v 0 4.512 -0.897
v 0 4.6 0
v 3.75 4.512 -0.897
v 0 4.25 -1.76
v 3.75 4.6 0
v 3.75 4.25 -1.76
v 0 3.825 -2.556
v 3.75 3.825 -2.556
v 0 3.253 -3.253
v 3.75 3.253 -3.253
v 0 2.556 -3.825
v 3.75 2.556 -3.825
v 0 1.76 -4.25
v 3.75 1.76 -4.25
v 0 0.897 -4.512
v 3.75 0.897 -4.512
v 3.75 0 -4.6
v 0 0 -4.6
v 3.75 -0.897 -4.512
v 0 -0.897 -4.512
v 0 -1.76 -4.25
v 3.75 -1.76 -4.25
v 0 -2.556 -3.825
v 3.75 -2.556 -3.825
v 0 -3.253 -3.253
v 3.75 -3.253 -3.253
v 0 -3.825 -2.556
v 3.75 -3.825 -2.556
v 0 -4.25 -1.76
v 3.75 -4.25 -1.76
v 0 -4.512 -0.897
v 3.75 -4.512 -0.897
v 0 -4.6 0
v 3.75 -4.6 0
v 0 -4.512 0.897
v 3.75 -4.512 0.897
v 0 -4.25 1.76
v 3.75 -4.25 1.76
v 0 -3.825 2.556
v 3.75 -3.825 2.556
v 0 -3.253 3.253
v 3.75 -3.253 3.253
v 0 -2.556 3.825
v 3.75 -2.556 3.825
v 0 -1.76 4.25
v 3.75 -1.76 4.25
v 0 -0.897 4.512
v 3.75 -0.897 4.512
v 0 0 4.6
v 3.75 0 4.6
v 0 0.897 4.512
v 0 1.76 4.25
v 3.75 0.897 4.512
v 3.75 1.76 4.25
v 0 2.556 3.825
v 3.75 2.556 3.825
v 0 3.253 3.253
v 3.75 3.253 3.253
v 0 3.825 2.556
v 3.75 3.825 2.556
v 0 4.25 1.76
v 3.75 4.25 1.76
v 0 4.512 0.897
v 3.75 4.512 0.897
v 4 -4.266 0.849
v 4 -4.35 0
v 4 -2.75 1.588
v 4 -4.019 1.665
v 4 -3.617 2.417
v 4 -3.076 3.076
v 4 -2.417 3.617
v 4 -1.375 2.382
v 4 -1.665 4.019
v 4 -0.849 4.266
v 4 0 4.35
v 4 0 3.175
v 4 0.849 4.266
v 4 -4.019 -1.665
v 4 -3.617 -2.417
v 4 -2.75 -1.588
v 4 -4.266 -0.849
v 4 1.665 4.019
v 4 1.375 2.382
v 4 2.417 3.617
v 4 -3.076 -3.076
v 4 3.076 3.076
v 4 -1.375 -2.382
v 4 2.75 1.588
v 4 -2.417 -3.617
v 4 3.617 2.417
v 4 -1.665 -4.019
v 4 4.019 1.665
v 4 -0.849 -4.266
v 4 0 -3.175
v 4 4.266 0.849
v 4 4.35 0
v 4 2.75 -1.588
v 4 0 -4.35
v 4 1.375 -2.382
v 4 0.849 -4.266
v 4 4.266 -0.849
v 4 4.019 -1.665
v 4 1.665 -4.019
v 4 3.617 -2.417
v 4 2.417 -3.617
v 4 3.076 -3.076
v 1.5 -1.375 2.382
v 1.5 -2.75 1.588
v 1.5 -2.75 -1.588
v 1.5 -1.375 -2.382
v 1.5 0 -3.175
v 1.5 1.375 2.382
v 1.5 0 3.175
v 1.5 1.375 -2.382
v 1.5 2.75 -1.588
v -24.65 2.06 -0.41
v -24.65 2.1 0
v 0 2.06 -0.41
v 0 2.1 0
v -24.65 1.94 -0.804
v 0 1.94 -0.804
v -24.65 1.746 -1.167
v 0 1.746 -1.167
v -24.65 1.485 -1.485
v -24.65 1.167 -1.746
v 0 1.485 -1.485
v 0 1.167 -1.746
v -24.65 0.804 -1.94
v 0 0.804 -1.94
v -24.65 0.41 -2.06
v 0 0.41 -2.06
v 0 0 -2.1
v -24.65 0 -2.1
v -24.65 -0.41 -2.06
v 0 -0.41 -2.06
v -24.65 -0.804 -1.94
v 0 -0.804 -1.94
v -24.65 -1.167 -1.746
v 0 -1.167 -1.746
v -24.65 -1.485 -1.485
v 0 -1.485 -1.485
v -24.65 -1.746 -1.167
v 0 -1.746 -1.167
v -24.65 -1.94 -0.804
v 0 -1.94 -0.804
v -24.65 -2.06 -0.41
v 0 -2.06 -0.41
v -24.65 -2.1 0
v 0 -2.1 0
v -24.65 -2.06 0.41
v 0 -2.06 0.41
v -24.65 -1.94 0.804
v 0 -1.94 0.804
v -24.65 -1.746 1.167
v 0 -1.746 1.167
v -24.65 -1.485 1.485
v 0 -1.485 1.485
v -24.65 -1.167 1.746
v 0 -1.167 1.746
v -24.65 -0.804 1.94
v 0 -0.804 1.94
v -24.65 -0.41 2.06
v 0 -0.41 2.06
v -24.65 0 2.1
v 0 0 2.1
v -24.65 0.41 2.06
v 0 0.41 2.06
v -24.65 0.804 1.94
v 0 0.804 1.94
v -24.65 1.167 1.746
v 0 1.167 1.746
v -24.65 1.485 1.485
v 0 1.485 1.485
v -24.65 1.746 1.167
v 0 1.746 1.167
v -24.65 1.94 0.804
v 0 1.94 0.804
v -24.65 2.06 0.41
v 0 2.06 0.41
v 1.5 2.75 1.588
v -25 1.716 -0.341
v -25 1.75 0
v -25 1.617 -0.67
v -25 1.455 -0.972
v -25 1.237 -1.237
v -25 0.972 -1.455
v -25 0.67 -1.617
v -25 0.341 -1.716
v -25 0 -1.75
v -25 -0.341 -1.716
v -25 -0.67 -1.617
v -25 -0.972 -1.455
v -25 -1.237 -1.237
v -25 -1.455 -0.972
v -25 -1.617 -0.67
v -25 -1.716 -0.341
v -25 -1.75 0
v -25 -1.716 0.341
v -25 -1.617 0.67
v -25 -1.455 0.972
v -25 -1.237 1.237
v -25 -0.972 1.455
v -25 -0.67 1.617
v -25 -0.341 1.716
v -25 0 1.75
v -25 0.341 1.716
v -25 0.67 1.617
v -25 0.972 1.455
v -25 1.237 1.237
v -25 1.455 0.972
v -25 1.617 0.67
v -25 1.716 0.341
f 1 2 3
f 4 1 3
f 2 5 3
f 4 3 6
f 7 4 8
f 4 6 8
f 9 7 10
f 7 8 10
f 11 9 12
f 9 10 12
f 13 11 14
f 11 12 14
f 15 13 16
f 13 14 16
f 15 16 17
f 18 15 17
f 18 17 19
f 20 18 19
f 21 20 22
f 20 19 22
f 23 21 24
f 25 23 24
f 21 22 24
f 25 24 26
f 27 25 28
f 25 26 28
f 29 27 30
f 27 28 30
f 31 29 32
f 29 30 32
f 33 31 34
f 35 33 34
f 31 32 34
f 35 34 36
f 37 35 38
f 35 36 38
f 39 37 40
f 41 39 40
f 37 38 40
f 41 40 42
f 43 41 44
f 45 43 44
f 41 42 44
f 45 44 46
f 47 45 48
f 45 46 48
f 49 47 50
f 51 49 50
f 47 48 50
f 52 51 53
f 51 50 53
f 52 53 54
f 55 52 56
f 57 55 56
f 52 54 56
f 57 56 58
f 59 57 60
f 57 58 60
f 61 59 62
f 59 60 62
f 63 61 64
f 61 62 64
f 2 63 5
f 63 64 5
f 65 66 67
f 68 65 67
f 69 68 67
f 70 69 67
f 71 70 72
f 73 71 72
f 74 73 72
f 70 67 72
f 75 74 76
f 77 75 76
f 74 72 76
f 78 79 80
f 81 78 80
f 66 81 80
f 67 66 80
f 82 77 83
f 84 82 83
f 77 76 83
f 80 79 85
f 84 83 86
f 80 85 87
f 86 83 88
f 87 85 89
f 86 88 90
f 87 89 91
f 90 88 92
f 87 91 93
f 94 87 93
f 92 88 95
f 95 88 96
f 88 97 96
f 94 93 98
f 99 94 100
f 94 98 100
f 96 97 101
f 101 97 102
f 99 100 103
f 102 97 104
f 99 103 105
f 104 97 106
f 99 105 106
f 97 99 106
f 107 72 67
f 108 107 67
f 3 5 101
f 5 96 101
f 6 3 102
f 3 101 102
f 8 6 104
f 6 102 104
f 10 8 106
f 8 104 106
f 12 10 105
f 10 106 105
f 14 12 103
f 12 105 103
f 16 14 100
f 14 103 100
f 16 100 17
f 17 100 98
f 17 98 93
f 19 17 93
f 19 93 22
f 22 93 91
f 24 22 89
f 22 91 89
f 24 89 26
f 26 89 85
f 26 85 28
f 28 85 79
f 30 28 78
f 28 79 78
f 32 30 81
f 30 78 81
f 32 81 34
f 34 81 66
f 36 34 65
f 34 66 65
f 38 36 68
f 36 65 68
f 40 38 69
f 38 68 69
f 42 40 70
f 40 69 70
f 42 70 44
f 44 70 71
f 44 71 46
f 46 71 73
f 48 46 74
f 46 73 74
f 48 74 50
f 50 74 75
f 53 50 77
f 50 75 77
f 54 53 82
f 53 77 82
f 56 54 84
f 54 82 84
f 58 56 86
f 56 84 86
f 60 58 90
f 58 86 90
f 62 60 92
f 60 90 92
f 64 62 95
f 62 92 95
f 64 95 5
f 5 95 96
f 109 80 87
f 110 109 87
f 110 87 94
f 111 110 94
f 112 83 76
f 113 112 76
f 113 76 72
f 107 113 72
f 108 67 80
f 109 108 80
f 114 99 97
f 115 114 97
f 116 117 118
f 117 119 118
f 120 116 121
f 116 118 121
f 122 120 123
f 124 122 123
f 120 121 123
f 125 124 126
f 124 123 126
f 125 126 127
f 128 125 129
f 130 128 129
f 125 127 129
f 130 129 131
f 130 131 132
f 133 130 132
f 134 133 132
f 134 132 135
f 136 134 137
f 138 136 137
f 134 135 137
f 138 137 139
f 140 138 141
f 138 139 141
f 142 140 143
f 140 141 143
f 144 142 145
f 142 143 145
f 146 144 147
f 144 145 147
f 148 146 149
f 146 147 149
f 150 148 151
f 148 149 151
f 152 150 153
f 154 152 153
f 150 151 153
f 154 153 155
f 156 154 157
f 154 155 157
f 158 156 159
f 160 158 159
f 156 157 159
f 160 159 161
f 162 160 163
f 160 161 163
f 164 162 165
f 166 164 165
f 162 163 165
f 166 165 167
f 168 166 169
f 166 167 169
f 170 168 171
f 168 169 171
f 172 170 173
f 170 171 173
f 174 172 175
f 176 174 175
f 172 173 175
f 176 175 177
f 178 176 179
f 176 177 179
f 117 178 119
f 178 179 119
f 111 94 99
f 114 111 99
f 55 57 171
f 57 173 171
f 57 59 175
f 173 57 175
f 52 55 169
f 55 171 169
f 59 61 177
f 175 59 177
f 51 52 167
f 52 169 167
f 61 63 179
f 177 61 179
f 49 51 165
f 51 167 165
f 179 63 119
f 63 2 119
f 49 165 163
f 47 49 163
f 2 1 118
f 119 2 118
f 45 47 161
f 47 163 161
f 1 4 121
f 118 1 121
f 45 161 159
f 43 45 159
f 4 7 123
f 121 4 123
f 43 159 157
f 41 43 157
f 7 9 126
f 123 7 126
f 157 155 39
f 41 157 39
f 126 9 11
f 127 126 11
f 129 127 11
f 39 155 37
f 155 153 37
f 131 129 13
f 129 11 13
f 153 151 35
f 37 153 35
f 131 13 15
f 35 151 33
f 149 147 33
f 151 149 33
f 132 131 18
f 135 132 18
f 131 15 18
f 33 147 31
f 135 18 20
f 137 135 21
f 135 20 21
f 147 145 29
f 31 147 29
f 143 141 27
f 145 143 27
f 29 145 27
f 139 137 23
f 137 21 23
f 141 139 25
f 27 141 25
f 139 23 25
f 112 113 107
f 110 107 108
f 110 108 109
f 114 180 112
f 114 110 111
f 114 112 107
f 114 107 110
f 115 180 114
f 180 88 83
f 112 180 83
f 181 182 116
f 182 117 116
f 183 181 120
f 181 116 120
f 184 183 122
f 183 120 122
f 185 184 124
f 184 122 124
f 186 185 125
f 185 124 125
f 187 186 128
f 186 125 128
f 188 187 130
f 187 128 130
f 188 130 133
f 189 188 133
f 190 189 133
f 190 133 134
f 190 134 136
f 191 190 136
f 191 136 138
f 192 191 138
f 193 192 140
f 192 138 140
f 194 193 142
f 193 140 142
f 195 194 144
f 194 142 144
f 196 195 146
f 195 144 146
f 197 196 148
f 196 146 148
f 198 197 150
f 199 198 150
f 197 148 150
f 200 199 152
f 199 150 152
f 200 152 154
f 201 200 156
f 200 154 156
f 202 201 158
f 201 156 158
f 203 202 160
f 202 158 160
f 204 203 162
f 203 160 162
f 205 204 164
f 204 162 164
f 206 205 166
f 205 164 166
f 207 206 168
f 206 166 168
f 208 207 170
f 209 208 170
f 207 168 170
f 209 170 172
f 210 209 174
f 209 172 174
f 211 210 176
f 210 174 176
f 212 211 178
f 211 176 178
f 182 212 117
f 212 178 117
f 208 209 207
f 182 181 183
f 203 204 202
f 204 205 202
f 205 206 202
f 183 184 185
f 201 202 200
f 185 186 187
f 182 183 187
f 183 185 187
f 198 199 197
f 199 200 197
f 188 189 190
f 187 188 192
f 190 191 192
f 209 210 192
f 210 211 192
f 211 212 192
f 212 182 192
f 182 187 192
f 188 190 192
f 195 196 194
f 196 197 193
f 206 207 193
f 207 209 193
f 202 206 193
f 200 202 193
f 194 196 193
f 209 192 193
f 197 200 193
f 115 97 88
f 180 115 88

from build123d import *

# Parameters (mm, degrees)
CUT_EXTRUDE1_DEPTH = 2.5


with BuildPart() as part:
    # Sketch1 → Revolve1 (revolve)
    with BuildSketch(Plane.XY):
        Polygon((0, 0), (-25, 0), (-25, 1.75), (-24.65, 2.1), (0, 2.1), (0, 4.6), (3.75, 4.6), (4, 4.35), (4, 0), align=None)
    revolve(axis=Axis((0, 0, 0), (-1, 0, 0)))

    # Sketch2 → Cut-Extrude1 (cut)
    with BuildSketch(Plane(origin=(4, 0, 0), x_dir=(0, 0, -1), z_dir=(1, 0, 0))):
        Polygon((0, 2.75), (-1.58771324, 2.75), (-2.38156986, 1.375), (-3.175426481, 0), (-2.38156986, -1.375), (-1.58771324, -2.75), (0, -2.75), (1.58771324, -2.75), (2.38156986, -1.375), (3.175426481, 0), (2.38156986, 1.375), (1.58771324, 2.75), align=None)
    extrude(amount=-CUT_EXTRUDE1_DEPTH, mode=Mode.SUBTRACT)


solid = part.part
